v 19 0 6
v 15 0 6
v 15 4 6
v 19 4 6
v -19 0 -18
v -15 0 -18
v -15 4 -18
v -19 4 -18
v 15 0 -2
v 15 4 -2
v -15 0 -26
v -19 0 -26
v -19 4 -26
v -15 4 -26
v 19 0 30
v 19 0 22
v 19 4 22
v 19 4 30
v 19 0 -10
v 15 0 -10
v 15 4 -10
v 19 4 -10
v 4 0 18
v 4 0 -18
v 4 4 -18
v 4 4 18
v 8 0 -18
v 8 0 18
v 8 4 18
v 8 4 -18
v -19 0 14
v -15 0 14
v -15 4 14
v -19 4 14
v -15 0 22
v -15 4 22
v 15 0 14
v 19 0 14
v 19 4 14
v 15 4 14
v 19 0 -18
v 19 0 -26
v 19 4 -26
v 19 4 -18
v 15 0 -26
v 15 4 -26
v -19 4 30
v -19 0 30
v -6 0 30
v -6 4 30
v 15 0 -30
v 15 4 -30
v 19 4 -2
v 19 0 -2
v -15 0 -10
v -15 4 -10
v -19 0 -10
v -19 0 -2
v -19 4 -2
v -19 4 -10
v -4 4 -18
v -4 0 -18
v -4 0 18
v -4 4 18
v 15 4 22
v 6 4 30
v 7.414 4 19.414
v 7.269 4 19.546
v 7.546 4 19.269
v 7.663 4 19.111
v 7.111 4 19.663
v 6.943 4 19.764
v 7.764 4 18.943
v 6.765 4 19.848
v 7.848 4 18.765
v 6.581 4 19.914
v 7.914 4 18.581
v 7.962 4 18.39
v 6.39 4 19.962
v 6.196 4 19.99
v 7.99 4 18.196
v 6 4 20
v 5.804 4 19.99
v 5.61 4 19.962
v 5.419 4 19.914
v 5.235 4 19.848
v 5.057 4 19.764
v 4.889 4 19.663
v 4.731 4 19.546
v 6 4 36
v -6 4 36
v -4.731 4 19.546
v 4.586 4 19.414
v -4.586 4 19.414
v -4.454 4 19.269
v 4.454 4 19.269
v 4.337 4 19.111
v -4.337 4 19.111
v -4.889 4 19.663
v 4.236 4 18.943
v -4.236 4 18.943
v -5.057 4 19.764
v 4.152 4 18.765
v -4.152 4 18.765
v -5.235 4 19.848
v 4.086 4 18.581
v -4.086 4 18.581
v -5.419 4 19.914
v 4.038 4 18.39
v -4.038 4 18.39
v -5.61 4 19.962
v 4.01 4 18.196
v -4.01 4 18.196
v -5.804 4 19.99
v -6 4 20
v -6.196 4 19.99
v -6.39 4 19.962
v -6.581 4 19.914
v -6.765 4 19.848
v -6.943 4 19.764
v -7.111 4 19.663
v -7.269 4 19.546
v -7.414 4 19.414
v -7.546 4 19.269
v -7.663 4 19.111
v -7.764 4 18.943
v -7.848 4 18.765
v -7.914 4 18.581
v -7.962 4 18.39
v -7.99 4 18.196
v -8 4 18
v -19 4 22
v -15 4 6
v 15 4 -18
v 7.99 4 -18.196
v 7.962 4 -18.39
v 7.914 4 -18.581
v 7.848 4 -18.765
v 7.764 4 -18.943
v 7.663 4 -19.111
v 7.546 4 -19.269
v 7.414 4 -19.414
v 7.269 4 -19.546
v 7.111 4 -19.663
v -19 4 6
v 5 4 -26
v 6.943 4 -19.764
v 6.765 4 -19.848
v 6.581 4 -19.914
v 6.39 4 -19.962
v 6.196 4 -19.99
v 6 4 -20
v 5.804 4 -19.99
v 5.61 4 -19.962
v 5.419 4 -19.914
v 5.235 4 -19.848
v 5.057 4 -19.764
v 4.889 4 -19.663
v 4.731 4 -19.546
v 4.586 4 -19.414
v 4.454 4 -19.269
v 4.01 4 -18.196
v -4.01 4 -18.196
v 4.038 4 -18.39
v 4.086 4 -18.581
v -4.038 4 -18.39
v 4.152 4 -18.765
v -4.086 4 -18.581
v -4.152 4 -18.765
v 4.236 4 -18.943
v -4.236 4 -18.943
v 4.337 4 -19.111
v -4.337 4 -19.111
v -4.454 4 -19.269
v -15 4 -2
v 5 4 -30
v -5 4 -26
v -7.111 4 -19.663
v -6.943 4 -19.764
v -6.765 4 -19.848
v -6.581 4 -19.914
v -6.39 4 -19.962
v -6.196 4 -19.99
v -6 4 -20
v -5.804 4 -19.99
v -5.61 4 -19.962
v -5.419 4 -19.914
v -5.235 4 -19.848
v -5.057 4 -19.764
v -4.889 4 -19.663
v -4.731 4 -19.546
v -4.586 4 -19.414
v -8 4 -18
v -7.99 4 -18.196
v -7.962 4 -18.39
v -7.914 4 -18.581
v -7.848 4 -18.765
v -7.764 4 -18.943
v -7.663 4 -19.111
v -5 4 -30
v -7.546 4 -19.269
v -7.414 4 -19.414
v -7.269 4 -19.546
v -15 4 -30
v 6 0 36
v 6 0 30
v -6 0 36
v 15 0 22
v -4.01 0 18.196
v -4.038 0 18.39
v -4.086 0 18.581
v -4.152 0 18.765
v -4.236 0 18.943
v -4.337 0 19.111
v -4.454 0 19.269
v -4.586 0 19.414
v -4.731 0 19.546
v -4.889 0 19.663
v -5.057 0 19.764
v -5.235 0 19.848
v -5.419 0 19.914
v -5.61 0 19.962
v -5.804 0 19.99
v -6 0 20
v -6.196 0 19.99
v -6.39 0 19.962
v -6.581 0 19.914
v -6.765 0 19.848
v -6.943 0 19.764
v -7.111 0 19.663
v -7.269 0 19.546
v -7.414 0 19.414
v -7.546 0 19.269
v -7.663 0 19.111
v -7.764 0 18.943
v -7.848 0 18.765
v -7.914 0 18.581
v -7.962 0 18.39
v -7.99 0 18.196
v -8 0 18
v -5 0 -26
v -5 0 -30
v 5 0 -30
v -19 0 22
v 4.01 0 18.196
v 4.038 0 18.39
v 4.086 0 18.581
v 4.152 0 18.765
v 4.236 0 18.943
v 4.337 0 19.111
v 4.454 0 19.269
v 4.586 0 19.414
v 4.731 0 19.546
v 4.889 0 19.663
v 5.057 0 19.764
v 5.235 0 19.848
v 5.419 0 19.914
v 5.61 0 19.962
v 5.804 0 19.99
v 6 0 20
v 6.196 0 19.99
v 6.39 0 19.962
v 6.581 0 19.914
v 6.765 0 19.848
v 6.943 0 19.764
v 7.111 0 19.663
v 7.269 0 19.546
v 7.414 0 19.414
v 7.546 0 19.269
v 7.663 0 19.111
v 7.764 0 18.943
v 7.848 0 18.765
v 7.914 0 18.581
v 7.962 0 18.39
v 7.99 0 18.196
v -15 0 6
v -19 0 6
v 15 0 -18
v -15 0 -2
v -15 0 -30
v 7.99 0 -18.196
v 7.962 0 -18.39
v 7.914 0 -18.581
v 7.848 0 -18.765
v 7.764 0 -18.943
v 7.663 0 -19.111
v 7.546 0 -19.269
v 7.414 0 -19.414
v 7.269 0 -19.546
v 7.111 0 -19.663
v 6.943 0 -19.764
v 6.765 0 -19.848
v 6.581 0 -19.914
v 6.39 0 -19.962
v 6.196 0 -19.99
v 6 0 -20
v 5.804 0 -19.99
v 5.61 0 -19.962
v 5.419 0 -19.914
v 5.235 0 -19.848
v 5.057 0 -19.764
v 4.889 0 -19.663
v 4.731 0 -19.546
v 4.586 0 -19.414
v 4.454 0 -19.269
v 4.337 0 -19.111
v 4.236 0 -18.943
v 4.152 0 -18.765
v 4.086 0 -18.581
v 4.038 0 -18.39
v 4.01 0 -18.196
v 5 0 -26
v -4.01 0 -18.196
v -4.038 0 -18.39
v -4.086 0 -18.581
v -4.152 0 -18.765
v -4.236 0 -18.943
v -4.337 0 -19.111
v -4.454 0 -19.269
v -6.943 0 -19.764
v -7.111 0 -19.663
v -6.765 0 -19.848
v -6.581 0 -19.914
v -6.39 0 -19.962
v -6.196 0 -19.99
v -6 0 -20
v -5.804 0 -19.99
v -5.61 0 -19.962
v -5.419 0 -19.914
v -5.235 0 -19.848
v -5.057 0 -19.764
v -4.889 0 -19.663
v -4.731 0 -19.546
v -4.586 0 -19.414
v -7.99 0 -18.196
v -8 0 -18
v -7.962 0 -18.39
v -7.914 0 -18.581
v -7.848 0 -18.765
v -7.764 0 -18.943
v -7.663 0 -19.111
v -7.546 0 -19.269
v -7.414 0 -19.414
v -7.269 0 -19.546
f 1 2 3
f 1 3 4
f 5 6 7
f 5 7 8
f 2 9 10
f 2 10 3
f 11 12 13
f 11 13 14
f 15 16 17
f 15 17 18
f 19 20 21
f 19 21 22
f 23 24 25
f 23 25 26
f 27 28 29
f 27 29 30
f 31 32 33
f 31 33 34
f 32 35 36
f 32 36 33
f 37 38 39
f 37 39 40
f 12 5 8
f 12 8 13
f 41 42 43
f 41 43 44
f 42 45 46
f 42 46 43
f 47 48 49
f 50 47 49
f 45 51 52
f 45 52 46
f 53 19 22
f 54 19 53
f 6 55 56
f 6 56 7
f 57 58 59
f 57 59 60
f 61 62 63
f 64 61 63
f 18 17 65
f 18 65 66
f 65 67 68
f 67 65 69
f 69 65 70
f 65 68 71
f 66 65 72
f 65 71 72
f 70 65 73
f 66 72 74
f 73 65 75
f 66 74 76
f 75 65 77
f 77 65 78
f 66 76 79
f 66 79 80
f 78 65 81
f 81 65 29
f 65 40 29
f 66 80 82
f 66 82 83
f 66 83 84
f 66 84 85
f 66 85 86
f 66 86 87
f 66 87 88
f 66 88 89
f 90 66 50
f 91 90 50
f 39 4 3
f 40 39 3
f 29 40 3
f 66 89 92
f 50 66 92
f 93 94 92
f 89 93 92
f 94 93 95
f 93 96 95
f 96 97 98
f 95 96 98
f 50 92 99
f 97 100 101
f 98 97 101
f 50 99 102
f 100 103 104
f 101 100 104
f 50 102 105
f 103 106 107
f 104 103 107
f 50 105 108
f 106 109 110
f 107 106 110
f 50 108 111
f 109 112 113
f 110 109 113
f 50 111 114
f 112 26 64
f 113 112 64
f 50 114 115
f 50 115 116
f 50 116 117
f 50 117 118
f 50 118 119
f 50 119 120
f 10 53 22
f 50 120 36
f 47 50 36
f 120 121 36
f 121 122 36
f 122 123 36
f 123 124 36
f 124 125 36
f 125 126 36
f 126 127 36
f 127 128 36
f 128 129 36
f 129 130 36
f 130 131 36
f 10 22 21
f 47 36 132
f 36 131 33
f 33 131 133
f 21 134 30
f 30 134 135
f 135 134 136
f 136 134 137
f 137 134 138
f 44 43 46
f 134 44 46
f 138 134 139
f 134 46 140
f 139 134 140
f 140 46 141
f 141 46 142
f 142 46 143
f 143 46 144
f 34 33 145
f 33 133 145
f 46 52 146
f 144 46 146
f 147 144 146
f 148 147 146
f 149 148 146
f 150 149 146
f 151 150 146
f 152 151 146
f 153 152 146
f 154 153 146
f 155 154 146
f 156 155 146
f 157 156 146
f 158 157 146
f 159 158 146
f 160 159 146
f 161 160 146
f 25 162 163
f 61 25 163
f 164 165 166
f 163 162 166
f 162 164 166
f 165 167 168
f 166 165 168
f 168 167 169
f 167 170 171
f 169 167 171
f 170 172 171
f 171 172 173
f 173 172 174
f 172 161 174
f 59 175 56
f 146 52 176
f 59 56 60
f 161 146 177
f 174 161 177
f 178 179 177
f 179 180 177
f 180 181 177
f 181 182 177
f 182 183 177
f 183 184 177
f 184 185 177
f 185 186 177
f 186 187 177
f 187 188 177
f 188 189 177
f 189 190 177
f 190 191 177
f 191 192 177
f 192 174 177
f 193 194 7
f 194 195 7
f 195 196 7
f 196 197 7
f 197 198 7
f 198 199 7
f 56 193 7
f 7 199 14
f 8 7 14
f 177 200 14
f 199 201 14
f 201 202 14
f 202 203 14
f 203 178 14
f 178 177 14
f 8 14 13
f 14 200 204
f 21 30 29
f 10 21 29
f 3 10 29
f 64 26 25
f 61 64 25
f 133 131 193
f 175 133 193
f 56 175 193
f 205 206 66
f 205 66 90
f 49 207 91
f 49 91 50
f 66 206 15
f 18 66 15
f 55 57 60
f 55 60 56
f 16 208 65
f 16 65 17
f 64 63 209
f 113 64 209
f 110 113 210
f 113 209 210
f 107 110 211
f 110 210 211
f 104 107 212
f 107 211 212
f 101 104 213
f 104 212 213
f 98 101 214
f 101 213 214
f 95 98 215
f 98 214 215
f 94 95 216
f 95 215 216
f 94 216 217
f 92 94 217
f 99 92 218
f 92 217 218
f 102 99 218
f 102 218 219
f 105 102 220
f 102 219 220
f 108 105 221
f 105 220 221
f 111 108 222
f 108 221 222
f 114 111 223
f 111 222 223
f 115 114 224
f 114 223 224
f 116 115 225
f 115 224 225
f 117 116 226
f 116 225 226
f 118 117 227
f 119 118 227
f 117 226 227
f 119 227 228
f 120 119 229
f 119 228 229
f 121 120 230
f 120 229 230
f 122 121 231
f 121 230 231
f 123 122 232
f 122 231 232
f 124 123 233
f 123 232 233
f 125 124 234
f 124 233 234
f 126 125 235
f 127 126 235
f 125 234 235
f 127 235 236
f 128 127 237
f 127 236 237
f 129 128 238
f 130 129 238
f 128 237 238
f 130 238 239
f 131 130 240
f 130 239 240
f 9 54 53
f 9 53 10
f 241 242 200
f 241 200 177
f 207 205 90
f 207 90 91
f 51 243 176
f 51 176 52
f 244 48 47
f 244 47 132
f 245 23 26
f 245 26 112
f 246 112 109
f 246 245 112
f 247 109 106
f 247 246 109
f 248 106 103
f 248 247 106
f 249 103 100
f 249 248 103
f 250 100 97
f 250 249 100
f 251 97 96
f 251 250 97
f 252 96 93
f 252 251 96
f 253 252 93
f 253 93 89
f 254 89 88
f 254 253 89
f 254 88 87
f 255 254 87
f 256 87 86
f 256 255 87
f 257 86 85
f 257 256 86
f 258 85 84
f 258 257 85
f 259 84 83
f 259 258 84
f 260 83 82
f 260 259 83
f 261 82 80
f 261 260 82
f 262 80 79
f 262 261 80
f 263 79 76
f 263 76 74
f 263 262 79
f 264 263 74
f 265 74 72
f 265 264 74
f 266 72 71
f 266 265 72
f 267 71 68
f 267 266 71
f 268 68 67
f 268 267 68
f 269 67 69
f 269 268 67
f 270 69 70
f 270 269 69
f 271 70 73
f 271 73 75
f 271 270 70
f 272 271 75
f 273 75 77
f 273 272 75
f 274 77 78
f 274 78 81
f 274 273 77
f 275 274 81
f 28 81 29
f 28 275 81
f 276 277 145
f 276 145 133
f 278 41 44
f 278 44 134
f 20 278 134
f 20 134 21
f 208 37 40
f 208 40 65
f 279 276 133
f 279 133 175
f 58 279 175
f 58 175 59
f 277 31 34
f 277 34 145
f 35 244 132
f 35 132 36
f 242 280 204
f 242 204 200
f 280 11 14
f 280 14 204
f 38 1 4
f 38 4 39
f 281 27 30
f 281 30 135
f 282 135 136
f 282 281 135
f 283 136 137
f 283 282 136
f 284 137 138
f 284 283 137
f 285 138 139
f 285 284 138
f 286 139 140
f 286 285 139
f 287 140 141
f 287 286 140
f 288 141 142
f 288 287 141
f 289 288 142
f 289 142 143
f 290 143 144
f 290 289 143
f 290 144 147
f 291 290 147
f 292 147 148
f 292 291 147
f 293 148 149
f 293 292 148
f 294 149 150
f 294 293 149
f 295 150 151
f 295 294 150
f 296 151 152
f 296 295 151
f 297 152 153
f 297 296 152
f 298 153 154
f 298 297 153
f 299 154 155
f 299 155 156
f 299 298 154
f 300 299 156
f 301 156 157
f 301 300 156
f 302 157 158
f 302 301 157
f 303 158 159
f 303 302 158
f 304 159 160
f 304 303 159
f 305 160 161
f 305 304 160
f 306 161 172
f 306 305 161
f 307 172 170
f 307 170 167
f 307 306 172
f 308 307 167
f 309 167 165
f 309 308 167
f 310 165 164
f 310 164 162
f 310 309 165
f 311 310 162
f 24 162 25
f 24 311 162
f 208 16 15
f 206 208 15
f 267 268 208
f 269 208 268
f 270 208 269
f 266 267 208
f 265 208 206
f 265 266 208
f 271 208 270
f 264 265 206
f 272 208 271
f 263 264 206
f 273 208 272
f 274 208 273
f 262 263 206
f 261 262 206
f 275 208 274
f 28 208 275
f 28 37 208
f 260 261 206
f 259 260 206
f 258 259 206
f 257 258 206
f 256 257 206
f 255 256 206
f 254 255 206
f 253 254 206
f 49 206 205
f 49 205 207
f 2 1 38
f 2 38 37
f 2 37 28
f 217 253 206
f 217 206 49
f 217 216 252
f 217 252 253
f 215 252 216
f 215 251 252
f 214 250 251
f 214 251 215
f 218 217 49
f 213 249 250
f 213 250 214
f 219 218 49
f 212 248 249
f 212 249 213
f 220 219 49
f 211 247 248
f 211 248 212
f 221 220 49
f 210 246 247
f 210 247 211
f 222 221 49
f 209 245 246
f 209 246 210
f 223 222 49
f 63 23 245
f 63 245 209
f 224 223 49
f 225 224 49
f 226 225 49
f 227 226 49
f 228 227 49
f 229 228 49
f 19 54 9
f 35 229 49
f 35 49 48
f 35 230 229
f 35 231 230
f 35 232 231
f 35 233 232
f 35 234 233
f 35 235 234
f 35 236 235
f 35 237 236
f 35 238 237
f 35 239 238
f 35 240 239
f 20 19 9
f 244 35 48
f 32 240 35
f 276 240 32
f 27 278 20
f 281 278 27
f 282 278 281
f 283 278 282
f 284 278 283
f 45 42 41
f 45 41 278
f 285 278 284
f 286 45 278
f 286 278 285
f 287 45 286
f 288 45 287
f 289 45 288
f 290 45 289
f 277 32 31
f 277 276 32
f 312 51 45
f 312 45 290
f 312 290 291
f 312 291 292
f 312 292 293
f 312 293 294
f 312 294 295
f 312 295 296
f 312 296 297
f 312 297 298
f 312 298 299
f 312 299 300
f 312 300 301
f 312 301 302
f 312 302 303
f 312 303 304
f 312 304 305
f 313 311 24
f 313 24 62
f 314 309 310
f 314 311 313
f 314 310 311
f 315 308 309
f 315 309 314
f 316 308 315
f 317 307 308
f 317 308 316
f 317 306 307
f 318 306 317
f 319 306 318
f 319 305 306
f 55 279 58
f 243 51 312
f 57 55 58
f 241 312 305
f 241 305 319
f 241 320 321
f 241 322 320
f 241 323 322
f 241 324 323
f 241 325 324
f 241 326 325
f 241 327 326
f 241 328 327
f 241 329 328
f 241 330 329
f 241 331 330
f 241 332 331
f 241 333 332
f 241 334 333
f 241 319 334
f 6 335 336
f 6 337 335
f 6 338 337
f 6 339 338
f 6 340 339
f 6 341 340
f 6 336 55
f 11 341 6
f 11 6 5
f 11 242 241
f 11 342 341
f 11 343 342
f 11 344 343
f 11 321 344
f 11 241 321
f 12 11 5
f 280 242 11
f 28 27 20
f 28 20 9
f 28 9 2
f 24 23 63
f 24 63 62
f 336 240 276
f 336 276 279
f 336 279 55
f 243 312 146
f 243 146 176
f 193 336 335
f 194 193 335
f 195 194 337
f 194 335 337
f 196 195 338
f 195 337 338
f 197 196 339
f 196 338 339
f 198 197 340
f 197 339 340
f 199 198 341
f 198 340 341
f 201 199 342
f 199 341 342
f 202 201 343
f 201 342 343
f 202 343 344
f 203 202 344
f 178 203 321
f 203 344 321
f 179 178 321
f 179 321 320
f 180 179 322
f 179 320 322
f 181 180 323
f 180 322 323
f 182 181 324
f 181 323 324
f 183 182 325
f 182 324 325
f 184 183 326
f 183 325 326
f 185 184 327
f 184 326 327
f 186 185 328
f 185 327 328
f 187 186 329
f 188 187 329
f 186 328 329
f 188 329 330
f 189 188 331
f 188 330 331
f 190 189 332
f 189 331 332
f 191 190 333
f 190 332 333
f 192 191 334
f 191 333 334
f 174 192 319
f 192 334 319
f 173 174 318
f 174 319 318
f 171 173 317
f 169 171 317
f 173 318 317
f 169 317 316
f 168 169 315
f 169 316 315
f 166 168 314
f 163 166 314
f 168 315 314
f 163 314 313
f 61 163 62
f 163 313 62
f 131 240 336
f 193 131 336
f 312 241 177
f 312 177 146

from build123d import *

# Parameters (mm, degrees)
BOSS_EXTRUDE1_DEPTH = 4


with BuildPart() as part:
    # Sketch1 → Boss-Extrude1 (new body)
    with BuildSketch(Plane(origin=(0, 0, 0), x_dir=(1, 0, 0), z_dir=(0, 1, 0))):
        Polygon((-5, 26), (5, 26), (5, 30), (15, 30), (15, 26), (19, 26), (19, 18), (15, 18), (15, 10), (19, 10), (19, 2), (15, 2), (15, -6), (19, -6), (19, -14), (15, -14), (15, -22), (19, -22), (19, -30), (15, -30), (6, -30), (6, -36), (-6, -36), (-6, -30), (-15, -30), (-19, -30), (-19, -22), (-15, -22), (-15, -14), (-19, -14), (-19, -6), (-15, -6), (-15, 2), (-19, 2), (-19, 10), (-15, 10), (-15, 18), (-19, 18), (-19, 26), (-15, 26), (-15, 30), (-5, 30), align=None)
        with BuildLine():
            Line((-8, -18), (-8, 18))
            ThreePointArc((-8, 18), (-6, 20), (-4, 18))
            Line((-4, 18), (-4, -18))
            ThreePointArc((-4, -18), (-6, -20), (-8, -18))
        make_face(mode=Mode.SUBTRACT)
        with BuildLine():
            Line((8, -18), (8, 18))
            ThreePointArc((8, 18), (6, 20), (4, 18))
            Line((4, 18), (4, -18))
            ThreePointArc((4, -18), (6, -20), (8, -18))
        make_face(mode=Mode.SUBTRACT)
    extrude(amount=BOSS_EXTRUDE1_DEPTH)


solid = part.part
